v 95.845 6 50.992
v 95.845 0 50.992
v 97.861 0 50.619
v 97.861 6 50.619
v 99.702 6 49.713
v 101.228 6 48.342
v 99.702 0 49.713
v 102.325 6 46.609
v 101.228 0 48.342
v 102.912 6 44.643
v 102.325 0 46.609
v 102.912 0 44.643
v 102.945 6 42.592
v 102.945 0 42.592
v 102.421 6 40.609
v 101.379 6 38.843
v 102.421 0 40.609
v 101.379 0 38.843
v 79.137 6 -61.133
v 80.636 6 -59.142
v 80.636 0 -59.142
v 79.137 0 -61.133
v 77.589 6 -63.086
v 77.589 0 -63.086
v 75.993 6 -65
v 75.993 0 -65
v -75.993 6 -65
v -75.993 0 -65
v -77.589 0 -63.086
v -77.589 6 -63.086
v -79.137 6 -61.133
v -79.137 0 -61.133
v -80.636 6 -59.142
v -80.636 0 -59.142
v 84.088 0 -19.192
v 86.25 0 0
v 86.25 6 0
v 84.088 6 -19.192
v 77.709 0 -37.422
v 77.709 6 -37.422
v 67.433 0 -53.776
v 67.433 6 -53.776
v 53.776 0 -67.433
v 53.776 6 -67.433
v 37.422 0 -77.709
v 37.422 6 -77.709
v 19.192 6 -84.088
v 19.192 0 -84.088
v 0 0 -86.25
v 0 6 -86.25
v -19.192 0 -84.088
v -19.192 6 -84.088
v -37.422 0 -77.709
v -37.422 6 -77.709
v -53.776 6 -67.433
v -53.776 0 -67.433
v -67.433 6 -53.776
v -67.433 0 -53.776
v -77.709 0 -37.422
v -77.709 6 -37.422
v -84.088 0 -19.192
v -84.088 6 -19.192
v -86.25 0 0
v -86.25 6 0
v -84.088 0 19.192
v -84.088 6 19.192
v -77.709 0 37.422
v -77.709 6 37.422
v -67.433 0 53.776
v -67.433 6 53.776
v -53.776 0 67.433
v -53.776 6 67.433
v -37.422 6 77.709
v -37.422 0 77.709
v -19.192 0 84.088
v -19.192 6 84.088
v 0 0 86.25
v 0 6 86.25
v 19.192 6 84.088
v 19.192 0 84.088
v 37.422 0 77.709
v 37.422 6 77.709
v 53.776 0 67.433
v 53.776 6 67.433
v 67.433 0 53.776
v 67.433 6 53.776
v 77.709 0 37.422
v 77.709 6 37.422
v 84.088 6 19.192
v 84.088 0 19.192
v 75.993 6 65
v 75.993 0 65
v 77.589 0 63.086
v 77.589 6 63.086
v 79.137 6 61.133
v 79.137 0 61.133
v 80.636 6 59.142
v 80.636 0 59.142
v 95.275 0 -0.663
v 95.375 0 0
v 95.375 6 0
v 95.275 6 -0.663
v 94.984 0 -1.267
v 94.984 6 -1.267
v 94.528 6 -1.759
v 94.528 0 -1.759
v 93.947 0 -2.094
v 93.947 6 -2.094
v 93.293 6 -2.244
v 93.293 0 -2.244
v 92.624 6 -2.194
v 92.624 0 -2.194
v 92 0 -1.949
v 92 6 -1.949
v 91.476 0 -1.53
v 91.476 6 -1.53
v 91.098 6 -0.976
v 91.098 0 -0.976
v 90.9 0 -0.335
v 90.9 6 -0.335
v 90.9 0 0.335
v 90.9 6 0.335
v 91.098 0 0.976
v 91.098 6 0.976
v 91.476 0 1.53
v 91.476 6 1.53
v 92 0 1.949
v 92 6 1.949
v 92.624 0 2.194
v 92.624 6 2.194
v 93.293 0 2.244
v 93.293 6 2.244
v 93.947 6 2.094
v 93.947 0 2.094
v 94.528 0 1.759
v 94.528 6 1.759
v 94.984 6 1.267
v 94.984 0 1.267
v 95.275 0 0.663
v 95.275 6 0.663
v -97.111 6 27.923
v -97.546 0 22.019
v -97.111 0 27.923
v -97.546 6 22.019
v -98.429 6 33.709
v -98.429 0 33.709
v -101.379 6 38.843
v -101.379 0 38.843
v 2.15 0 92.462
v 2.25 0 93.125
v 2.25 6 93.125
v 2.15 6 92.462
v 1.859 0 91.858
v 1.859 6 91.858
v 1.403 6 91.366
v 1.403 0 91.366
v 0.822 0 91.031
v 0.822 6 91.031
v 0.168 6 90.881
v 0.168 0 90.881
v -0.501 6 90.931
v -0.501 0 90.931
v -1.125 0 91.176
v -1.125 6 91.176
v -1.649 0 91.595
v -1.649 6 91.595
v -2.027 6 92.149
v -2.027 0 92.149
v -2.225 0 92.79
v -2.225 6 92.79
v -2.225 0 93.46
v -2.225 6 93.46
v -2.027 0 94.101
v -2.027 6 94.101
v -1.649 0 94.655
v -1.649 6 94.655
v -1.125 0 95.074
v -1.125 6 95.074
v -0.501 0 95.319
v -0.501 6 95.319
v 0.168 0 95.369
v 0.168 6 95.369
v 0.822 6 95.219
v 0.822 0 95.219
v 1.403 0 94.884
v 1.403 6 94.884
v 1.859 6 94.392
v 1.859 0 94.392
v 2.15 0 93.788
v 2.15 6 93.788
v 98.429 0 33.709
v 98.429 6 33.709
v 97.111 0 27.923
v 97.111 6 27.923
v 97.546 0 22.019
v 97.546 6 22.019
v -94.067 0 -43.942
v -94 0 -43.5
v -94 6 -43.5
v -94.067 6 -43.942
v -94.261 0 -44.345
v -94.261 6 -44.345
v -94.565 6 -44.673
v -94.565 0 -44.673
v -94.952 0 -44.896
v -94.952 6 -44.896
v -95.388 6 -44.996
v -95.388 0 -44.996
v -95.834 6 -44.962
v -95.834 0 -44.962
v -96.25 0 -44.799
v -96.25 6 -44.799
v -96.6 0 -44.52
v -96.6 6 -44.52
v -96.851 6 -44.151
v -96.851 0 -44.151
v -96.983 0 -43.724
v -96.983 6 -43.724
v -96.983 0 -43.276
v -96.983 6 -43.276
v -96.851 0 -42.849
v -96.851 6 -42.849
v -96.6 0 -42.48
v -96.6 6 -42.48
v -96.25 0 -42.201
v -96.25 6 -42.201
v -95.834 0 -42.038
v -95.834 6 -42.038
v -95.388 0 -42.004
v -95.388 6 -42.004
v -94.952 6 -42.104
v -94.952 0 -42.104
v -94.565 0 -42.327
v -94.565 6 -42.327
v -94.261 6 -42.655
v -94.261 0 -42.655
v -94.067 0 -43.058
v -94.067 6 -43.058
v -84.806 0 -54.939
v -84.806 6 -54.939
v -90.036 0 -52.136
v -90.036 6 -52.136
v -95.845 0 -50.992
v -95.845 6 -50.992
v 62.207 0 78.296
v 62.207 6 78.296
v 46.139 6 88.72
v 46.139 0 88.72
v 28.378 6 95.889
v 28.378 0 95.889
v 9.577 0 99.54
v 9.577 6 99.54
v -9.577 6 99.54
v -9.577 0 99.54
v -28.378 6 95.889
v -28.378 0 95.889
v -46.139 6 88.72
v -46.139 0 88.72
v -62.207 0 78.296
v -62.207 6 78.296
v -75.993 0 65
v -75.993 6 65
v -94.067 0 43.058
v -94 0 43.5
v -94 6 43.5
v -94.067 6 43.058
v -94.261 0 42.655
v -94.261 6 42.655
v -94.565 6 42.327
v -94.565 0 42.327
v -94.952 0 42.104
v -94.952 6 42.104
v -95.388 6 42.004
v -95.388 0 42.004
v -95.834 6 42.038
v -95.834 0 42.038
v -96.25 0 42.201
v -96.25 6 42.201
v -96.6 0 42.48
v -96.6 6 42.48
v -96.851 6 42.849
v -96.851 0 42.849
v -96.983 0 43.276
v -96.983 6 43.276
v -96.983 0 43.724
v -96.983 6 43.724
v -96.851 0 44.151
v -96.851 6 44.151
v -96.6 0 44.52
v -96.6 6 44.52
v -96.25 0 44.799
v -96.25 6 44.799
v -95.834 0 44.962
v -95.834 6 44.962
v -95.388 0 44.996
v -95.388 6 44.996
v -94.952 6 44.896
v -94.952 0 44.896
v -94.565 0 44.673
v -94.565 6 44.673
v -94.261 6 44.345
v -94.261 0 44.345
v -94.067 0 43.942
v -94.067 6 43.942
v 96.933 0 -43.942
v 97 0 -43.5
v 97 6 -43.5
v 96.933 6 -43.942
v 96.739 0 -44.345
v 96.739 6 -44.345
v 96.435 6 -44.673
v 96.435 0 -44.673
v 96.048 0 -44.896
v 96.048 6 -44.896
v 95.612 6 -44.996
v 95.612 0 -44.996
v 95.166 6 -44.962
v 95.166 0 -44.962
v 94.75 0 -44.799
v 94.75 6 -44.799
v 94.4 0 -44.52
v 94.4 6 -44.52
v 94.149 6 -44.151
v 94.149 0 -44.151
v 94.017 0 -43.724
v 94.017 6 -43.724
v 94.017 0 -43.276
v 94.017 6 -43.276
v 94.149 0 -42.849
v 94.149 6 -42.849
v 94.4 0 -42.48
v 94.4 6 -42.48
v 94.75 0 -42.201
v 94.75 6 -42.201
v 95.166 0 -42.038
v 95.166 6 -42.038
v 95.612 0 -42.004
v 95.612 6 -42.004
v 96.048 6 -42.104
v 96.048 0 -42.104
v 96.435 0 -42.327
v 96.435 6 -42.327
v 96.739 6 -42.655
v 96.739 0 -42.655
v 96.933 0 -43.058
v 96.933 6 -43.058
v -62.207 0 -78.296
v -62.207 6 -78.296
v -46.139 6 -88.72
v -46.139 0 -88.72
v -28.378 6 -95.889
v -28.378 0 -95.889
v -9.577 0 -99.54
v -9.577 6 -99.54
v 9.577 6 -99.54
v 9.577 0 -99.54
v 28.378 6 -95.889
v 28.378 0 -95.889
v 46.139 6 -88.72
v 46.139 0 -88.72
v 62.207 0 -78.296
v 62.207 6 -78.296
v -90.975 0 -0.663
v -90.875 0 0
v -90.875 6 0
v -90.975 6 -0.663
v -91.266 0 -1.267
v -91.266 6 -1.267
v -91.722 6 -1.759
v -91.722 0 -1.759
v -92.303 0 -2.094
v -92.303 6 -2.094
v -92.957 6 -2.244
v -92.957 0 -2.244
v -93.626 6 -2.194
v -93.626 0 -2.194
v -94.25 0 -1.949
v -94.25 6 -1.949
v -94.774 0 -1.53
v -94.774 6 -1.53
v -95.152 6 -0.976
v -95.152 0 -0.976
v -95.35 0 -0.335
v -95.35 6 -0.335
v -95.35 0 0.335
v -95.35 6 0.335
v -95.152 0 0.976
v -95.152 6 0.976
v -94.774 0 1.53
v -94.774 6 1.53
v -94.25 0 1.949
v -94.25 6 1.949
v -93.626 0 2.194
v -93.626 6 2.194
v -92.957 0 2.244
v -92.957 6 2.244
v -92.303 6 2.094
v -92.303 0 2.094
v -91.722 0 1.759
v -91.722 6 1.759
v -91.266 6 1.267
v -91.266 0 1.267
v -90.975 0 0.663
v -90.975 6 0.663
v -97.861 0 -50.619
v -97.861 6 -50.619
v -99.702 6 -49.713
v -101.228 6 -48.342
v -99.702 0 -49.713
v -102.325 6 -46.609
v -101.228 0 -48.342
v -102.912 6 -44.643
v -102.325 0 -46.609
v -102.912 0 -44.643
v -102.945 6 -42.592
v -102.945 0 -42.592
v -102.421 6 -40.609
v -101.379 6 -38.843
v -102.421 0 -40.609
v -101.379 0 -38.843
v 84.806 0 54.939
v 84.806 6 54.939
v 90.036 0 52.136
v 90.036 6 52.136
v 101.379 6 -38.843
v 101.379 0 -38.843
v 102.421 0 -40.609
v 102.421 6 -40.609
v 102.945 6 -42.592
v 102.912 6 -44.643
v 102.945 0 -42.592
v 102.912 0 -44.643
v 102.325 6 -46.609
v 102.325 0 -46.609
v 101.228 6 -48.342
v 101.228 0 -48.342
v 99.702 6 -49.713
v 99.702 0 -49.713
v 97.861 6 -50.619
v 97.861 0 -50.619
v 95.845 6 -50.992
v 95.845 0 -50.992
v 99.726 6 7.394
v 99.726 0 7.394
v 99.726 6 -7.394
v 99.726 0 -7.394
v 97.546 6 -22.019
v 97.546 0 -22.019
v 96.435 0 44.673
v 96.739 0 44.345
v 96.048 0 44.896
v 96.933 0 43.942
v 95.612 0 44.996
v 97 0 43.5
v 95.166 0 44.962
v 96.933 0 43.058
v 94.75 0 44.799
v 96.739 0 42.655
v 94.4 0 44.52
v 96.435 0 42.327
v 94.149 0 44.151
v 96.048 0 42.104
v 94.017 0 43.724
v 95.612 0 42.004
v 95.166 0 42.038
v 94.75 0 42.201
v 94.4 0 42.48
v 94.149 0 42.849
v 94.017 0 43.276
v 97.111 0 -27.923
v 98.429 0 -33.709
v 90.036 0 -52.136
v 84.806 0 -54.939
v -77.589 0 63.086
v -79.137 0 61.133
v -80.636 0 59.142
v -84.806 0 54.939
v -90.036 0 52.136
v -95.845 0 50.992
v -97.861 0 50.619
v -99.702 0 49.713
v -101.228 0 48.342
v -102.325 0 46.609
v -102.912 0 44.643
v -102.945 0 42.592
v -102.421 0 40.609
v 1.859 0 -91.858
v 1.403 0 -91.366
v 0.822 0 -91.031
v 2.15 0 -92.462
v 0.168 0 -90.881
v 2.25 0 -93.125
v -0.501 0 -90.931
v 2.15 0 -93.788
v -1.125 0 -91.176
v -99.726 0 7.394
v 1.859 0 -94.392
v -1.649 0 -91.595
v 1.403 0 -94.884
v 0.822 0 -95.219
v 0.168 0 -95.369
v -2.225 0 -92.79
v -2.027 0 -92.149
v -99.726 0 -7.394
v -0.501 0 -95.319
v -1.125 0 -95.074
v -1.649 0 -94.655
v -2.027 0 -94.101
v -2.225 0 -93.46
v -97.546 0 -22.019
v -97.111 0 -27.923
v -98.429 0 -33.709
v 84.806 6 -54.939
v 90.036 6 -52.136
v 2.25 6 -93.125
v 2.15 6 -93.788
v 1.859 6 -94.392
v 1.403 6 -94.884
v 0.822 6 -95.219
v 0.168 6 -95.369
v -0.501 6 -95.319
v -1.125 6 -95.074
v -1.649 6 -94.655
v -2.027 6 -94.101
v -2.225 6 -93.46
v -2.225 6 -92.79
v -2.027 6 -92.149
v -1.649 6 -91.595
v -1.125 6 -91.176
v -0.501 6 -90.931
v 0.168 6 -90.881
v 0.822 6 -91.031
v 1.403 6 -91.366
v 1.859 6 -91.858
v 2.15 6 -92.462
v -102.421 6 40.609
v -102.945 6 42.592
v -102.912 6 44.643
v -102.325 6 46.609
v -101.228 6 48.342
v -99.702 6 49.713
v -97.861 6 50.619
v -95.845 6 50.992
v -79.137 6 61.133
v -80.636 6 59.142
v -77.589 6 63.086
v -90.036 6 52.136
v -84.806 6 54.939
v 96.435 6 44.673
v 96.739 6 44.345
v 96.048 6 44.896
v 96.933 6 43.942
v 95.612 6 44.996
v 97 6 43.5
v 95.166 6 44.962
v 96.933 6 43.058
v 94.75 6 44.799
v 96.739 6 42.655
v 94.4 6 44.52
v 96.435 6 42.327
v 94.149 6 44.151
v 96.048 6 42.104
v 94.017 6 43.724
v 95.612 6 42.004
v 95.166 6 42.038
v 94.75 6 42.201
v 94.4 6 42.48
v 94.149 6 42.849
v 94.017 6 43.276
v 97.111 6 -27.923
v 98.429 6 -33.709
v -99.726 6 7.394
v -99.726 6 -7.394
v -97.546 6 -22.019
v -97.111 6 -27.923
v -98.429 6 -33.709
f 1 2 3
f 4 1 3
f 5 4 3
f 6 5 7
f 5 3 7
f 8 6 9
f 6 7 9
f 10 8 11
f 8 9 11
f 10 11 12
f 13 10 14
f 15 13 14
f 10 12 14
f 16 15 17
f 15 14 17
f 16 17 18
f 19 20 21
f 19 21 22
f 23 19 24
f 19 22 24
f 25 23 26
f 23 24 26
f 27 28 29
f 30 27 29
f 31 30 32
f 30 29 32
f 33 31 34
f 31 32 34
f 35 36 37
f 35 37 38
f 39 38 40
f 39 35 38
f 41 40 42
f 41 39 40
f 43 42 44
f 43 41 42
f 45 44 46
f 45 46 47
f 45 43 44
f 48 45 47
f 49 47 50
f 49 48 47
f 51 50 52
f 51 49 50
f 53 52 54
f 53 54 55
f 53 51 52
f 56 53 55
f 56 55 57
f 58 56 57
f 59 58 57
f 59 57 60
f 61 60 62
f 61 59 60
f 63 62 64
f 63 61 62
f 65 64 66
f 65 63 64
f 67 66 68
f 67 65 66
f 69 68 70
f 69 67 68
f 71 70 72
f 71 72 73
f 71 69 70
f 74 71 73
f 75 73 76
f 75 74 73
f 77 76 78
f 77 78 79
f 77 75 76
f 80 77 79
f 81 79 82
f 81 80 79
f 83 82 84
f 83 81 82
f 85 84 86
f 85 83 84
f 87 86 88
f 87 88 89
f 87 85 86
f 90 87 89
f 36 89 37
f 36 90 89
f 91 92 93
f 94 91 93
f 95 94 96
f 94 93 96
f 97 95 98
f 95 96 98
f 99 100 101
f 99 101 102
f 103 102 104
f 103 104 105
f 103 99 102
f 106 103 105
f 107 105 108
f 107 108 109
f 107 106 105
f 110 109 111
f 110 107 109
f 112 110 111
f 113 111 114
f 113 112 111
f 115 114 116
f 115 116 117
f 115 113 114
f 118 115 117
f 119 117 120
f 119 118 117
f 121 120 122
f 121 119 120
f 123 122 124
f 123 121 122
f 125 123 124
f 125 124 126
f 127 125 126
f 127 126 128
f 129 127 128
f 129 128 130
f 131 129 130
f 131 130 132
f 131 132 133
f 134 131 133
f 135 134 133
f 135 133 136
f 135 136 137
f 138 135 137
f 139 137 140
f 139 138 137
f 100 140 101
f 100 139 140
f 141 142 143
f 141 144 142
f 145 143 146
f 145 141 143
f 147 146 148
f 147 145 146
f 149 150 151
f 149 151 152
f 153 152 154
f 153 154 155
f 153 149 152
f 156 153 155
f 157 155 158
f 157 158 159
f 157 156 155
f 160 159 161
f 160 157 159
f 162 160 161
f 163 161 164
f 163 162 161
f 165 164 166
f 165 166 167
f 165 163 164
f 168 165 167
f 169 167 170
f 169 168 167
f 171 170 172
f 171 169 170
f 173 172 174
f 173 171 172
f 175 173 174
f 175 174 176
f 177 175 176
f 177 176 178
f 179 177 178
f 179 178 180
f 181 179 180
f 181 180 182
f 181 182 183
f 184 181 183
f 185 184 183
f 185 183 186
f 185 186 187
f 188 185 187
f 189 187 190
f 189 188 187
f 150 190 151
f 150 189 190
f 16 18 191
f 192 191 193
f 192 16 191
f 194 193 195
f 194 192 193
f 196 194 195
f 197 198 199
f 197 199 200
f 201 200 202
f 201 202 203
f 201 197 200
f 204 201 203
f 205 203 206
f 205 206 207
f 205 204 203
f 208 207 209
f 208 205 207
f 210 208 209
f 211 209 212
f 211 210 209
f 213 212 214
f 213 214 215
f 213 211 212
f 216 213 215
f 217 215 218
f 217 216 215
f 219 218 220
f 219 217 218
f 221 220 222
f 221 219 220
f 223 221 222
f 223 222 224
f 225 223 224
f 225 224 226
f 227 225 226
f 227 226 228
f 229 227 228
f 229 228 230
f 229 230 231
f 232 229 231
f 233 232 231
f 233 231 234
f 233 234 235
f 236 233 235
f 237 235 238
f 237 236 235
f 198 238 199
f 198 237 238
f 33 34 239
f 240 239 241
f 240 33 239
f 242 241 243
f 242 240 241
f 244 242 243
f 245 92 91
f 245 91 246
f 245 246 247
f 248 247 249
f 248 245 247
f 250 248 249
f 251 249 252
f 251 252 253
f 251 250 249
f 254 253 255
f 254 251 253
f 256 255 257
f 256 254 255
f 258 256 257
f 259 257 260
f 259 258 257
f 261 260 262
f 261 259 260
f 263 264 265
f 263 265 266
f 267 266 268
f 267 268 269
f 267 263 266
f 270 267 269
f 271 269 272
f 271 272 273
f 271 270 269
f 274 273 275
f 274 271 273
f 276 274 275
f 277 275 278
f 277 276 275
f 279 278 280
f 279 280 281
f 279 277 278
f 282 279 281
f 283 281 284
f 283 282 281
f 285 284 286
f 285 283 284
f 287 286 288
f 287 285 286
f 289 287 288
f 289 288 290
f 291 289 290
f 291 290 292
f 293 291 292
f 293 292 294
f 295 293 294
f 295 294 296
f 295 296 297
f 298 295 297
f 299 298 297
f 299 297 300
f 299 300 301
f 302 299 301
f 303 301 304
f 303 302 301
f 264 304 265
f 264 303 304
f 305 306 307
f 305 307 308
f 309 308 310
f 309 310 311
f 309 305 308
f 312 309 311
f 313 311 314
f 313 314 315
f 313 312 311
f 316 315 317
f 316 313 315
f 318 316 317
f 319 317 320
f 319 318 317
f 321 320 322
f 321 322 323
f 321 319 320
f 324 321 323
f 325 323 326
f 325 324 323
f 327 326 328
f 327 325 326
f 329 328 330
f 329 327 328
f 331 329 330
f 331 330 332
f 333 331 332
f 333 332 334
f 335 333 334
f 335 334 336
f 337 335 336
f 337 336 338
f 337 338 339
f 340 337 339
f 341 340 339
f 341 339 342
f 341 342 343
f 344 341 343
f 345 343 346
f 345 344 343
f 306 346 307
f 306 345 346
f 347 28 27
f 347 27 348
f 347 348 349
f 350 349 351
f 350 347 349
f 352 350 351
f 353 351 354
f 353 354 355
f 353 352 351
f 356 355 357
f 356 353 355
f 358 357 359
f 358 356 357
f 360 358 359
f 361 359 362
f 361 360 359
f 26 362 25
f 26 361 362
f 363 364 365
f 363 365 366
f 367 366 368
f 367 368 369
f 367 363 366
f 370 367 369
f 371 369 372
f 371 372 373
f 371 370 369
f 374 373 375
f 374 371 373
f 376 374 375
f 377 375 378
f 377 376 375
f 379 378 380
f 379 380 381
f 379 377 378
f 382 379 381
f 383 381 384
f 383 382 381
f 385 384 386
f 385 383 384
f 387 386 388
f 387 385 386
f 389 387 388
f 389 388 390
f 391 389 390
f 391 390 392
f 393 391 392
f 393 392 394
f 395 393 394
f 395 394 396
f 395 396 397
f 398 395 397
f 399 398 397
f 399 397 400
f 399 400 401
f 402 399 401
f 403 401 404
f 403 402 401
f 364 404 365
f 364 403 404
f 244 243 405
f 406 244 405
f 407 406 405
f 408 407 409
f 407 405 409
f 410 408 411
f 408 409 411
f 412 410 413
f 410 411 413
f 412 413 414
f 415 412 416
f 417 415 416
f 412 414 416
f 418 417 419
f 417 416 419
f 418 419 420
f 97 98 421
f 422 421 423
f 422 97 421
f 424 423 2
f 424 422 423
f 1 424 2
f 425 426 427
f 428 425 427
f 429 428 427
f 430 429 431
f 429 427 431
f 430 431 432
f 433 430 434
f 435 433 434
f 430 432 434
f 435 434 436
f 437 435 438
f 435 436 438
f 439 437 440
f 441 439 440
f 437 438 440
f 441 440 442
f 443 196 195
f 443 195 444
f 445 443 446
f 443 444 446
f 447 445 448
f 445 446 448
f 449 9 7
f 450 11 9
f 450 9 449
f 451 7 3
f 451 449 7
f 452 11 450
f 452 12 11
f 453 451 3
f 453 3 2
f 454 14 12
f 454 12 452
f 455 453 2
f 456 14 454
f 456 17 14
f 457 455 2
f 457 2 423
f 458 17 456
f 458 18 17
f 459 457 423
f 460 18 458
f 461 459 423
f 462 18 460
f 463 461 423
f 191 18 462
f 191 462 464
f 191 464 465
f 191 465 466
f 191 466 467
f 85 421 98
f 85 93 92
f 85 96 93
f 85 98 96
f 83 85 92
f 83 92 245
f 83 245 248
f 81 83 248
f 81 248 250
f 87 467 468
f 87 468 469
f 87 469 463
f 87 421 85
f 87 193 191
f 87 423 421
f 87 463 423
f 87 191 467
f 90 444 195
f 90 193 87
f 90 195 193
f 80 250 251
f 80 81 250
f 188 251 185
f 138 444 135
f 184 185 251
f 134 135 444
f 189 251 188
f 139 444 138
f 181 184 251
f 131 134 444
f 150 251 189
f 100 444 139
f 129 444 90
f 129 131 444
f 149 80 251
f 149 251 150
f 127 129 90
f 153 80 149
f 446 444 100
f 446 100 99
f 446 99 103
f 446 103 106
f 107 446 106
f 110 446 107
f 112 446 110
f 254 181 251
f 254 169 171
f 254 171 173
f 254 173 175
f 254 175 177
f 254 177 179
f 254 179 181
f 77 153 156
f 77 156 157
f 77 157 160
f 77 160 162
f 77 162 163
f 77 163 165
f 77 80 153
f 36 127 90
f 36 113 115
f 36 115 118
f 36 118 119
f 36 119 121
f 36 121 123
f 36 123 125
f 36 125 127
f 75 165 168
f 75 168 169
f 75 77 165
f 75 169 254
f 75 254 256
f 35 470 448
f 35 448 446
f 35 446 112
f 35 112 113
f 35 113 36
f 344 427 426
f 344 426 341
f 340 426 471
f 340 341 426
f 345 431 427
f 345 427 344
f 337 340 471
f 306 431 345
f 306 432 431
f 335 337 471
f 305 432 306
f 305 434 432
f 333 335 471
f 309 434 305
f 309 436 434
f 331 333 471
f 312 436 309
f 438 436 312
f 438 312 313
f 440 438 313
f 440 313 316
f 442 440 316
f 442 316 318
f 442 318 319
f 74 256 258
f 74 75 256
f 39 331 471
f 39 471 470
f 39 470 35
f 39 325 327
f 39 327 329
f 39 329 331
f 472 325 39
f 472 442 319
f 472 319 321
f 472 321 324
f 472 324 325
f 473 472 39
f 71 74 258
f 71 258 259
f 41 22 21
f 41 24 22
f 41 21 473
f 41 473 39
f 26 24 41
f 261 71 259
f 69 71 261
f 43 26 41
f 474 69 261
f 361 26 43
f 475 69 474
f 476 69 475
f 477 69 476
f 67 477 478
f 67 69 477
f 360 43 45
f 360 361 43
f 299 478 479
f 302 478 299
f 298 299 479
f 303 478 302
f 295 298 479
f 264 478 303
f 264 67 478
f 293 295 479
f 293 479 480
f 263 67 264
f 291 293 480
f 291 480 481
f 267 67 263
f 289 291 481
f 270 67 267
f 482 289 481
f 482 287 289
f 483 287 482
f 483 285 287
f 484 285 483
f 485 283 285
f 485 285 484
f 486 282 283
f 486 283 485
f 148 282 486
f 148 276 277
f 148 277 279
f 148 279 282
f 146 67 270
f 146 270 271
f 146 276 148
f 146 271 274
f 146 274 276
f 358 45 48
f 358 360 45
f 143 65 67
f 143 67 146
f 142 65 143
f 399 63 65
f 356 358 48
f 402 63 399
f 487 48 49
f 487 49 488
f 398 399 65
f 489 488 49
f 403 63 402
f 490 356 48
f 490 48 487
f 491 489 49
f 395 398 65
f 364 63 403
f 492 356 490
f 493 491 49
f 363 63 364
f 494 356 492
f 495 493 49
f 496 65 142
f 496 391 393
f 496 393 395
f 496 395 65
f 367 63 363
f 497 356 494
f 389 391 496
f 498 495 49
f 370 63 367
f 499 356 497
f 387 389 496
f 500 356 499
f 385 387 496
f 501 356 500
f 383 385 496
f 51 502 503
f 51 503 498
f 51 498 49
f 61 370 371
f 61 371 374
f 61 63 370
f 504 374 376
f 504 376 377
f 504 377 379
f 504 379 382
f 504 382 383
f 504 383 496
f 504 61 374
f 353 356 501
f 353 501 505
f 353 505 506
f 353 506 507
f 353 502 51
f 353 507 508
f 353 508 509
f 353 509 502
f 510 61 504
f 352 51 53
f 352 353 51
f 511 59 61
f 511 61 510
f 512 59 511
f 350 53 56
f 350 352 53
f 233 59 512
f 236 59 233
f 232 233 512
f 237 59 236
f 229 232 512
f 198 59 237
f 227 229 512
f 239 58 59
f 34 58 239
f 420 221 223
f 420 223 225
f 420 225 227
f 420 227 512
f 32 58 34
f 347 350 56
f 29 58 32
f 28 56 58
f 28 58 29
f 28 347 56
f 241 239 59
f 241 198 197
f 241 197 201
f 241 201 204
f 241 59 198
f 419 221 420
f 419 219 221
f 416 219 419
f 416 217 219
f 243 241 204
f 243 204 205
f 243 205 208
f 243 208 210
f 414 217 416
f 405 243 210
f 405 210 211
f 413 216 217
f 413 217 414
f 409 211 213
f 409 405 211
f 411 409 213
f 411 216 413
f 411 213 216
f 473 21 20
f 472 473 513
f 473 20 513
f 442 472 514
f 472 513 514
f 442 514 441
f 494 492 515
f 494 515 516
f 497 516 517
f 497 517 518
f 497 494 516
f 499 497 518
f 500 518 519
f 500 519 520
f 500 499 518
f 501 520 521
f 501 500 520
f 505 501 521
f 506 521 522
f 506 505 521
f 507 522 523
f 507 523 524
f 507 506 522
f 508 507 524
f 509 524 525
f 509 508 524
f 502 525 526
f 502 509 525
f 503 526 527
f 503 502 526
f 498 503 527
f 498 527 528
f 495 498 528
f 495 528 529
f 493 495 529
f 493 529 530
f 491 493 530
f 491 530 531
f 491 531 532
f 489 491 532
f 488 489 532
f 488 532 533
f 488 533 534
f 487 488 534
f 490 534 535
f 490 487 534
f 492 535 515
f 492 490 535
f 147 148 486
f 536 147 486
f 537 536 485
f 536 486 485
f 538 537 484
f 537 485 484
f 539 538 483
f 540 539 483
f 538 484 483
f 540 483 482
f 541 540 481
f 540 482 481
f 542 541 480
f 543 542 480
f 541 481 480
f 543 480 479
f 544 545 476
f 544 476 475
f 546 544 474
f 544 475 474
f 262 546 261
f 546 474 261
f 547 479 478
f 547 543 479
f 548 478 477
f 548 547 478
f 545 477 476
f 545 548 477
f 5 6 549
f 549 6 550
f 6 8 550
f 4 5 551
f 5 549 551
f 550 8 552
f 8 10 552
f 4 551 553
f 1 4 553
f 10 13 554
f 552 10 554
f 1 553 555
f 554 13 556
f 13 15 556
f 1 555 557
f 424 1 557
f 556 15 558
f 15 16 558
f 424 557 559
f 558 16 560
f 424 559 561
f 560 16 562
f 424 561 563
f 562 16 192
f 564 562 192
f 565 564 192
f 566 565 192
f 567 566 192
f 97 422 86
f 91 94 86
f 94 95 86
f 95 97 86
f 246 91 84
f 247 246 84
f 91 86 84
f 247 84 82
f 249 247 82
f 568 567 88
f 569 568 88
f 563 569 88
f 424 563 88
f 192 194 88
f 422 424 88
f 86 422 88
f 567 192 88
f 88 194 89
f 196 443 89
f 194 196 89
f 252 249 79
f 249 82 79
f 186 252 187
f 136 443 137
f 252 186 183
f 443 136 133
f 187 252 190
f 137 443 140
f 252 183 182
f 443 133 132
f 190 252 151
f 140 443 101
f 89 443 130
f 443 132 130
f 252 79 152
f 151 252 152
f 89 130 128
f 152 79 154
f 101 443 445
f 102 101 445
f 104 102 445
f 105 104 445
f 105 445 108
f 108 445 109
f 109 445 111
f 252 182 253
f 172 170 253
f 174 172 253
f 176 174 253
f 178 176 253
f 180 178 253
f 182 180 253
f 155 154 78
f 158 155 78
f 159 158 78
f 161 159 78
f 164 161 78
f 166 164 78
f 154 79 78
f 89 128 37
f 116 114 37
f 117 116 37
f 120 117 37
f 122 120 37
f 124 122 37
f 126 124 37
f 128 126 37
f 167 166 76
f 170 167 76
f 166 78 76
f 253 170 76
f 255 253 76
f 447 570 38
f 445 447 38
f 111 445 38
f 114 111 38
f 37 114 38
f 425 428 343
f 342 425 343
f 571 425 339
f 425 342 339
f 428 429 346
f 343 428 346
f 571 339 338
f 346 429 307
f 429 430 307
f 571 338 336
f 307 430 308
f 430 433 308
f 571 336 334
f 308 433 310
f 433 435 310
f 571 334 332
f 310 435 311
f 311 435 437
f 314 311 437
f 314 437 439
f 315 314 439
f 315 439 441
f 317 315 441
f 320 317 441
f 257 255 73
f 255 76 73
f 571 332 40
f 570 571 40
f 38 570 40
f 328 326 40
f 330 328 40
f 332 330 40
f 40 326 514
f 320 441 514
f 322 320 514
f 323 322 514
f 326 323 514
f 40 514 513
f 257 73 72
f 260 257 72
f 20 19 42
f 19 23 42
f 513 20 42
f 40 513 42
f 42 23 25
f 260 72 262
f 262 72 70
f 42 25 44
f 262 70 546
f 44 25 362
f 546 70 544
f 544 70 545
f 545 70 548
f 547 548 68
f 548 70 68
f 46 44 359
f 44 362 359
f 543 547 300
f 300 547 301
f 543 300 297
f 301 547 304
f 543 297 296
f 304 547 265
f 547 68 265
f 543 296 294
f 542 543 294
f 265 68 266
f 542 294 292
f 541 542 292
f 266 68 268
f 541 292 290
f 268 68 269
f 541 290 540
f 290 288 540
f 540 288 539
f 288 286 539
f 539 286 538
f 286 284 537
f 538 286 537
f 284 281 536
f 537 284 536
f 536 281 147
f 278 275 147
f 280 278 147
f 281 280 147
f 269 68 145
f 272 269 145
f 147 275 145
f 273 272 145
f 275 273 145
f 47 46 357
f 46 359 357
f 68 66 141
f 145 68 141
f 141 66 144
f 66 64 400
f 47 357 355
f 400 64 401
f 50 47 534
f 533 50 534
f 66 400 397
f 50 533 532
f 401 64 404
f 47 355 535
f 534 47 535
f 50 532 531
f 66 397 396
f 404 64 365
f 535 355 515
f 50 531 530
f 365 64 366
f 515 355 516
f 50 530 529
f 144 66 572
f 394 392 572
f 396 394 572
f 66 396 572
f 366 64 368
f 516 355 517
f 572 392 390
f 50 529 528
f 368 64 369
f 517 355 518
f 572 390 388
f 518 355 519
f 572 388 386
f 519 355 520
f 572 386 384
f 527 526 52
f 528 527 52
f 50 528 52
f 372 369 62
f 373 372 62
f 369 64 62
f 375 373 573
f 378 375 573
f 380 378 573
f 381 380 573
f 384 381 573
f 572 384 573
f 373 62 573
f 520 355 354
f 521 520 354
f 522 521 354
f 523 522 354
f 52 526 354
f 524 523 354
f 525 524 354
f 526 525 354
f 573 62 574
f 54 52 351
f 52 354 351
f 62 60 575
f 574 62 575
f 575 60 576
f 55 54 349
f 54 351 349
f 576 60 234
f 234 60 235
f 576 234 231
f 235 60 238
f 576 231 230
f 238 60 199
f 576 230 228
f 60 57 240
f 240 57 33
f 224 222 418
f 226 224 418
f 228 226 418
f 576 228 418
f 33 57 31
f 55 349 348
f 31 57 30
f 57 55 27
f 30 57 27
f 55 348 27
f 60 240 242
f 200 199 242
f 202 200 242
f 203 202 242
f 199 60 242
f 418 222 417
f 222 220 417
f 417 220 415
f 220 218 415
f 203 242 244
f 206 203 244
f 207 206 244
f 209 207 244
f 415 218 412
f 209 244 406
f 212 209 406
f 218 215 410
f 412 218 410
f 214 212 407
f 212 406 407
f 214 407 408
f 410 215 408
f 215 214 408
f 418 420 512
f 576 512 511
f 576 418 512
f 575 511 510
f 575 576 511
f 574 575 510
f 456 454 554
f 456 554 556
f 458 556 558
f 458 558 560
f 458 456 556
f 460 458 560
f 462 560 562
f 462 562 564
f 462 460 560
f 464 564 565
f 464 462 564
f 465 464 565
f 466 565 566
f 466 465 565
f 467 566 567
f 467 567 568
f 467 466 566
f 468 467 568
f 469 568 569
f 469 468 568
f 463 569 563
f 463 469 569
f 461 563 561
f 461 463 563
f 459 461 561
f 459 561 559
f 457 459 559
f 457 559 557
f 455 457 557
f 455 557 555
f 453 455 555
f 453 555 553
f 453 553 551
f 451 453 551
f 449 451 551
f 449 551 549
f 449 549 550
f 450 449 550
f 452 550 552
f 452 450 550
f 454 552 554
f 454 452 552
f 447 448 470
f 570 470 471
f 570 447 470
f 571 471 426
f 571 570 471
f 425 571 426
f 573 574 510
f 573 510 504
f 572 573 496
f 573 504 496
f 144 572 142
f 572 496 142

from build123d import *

# Parameters (mm, degrees)
SKETCH1_R           = 86.25
BOSS_EXTRUDE1_DEPTH = 6
SKETCH2_R           = 1.5
CUT_EXTRUDE1_DEPTH  = 6
SKETCH3_R           = 2.25
CUT_EXTRUDE2_DEPTH  = 6
CUT_EXTRUDE3_DEPTH  = 6
FILLET1_R           = 20


with BuildPart() as part:
    # Sketch1 → Boss-Extrude1 (new body)
    with BuildSketch(Plane(origin=(0, 0, 0), x_dir=(1, 0, 0), z_dir=(0, 1, 0))):
        with BuildLine():
            Line((75.993420768, 65), (110, 65))
            Line((110, 65), (110, -65))
            Line((110, -65), (75.993420768, -65))
            ThreePointArc((75.993420768, -65), (0, -100), (-75.993420768, -65))
            Line((-75.993420768, -65), (-110, -65))
            Line((-110, -65), (-110, 65))
            Line((-110, 65), (-75.993420768, 65))
            ThreePointArc((-75.993420768, 65), (0, 100), (75.993420768, 65))
        make_face()
        Circle(SKETCH1_R, mode=Mode.SUBTRACT)
    extrude(amount=BOSS_EXTRUDE1_DEPTH)

    # Sketch2 → Cut-Extrude1 (cut)
    with BuildSketch(Plane(origin=(0, 0, 0), x_dir=(1, 0, 0), z_dir=(0, 1, 0))):
        with Locations((-95.5, 43.5)):
            Circle(SKETCH2_R)
        with Locations((95.5, 43.5)):
            Circle(SKETCH2_R)
        with Locations((95.5, -43.5)):
            Circle(SKETCH2_R)
        with Locations((-95.5, -43.5)):
            Circle(SKETCH2_R)
    extrude(amount=CUT_EXTRUDE1_DEPTH, mode=Mode.SUBTRACT)

    # Sketch3 → Cut-Extrude2 (cut)
    with BuildSketch(Plane(origin=(0, 0, 0), x_dir=(1, 0, 0), z_dir=(0, 1, 0))):
        with Locations((0, 93.125)):
            Circle(SKETCH3_R)
        with Locations((93.125, 0)):
            Circle(SKETCH3_R)
        with Locations((0, -93.125)):
            Circle(SKETCH3_R)
        with Locations((-93.125, 0)):
            Circle(SKETCH3_R)
    extrude(amount=CUT_EXTRUDE2_DEPTH, mode=Mode.SUBTRACT)

    # Sketch4 → Cut-Extrude3 (cut)
    with BuildSketch(Plane(origin=(0, 0, 0), x_dir=(1, 0, 0), z_dir=(0, 1, 0))):
        with BuildLine():
            Line((98.608905775, -36.674701114), (93.856581268, -34.510029742))
            ThreePointArc((93.856581268, -34.510029742), (100, 0), (93.856581268, 34.510029742))
            Line((93.856581268, 34.510029742), (98.608905775, 36.674701114))
            ThreePointArc((98.608905775, 36.674701114), (102.325298886, 46.608905775), (92.391094225, 50.325298886))
            Line((92.391094225, 50.325298886), (87.638769717, 48.160627513))
            ThreePointArc((87.638769717, 48.160627513), (82.248188777, 56.879130117), (75.993420768, 65))
            Line((75.993420768, 65), (110, 65))
            Line((110, 65), (110, -65))
            Line((110, -65), (75.993420768, -65))
            ThreePointArc((75.993420768, -65), (82.248188777, -56.879130117), (87.638769717, -48.160627513))
            Line((87.638769717, -48.160627513), (92.391094225, -50.325298886))
            ThreePointArc((92.391094225, -50.325298886), (102.325298886, -46.608905775), (98.608905775, -36.674701114))
        make_face()
        with BuildLine():
            Line((-98.608905775, 36.674701114), (-93.856581268, 34.510029742))
            ThreePointArc((-93.856581268, 34.510029742), (-100, 0), (-93.856581268, -34.510029742))
            Line((-93.856581268, -34.510029742), (-98.608905775, -36.674701114))
            ThreePointArc((-98.608905775, -36.674701114), (-102.325298886, -46.608905775), (-92.391094225, -50.325298886))
            Line((-92.391094225, -50.325298886), (-87.638769717, -48.160627513))
            ThreePointArc((-87.638769717, -48.160627513), (-82.248188777, -56.879130117), (-75.993420768, -65))
            Line((-75.993420768, -65), (-110, -65))
            Line((-110, -65), (-110, 65))
            Line((-110, 65), (-75.993420768, 65))
            ThreePointArc((-75.993420768, 65), (-82.248188777, 56.879130117), (-87.638769717, 48.160627513))
            Line((-87.638769717, 48.160627513), (-92.391094225, 50.325298886))
            ThreePointArc((-92.391094225, 50.325298886), (-102.325298886, 46.608905775), (-98.608905775, 36.674701114))
        make_face()
    extrude(amount=CUT_EXTRUDE3_DEPTH, mode=Mode.SUBTRACT)

    # Fillet1
    fillet1_edges = [part.edges().sort_by_distance(p)[0] for p in [
        (87.638769717, 3, -48.160627513),
        (93.856581268, 3, -34.510029742),
        (93.856581268, 3, 34.510029742),
        (87.638769717, 3, 48.160627513),
        (-87.638769717, 3, 48.160627513),
        (-93.856581268, 3, 34.510029742),
        (-93.856581268, 3, -34.510029742),
        (-87.638769717, 3, -48.160627513),
    ]]
    fillet(fillet1_edges, radius=FILLET1_R)


solid = part.part
